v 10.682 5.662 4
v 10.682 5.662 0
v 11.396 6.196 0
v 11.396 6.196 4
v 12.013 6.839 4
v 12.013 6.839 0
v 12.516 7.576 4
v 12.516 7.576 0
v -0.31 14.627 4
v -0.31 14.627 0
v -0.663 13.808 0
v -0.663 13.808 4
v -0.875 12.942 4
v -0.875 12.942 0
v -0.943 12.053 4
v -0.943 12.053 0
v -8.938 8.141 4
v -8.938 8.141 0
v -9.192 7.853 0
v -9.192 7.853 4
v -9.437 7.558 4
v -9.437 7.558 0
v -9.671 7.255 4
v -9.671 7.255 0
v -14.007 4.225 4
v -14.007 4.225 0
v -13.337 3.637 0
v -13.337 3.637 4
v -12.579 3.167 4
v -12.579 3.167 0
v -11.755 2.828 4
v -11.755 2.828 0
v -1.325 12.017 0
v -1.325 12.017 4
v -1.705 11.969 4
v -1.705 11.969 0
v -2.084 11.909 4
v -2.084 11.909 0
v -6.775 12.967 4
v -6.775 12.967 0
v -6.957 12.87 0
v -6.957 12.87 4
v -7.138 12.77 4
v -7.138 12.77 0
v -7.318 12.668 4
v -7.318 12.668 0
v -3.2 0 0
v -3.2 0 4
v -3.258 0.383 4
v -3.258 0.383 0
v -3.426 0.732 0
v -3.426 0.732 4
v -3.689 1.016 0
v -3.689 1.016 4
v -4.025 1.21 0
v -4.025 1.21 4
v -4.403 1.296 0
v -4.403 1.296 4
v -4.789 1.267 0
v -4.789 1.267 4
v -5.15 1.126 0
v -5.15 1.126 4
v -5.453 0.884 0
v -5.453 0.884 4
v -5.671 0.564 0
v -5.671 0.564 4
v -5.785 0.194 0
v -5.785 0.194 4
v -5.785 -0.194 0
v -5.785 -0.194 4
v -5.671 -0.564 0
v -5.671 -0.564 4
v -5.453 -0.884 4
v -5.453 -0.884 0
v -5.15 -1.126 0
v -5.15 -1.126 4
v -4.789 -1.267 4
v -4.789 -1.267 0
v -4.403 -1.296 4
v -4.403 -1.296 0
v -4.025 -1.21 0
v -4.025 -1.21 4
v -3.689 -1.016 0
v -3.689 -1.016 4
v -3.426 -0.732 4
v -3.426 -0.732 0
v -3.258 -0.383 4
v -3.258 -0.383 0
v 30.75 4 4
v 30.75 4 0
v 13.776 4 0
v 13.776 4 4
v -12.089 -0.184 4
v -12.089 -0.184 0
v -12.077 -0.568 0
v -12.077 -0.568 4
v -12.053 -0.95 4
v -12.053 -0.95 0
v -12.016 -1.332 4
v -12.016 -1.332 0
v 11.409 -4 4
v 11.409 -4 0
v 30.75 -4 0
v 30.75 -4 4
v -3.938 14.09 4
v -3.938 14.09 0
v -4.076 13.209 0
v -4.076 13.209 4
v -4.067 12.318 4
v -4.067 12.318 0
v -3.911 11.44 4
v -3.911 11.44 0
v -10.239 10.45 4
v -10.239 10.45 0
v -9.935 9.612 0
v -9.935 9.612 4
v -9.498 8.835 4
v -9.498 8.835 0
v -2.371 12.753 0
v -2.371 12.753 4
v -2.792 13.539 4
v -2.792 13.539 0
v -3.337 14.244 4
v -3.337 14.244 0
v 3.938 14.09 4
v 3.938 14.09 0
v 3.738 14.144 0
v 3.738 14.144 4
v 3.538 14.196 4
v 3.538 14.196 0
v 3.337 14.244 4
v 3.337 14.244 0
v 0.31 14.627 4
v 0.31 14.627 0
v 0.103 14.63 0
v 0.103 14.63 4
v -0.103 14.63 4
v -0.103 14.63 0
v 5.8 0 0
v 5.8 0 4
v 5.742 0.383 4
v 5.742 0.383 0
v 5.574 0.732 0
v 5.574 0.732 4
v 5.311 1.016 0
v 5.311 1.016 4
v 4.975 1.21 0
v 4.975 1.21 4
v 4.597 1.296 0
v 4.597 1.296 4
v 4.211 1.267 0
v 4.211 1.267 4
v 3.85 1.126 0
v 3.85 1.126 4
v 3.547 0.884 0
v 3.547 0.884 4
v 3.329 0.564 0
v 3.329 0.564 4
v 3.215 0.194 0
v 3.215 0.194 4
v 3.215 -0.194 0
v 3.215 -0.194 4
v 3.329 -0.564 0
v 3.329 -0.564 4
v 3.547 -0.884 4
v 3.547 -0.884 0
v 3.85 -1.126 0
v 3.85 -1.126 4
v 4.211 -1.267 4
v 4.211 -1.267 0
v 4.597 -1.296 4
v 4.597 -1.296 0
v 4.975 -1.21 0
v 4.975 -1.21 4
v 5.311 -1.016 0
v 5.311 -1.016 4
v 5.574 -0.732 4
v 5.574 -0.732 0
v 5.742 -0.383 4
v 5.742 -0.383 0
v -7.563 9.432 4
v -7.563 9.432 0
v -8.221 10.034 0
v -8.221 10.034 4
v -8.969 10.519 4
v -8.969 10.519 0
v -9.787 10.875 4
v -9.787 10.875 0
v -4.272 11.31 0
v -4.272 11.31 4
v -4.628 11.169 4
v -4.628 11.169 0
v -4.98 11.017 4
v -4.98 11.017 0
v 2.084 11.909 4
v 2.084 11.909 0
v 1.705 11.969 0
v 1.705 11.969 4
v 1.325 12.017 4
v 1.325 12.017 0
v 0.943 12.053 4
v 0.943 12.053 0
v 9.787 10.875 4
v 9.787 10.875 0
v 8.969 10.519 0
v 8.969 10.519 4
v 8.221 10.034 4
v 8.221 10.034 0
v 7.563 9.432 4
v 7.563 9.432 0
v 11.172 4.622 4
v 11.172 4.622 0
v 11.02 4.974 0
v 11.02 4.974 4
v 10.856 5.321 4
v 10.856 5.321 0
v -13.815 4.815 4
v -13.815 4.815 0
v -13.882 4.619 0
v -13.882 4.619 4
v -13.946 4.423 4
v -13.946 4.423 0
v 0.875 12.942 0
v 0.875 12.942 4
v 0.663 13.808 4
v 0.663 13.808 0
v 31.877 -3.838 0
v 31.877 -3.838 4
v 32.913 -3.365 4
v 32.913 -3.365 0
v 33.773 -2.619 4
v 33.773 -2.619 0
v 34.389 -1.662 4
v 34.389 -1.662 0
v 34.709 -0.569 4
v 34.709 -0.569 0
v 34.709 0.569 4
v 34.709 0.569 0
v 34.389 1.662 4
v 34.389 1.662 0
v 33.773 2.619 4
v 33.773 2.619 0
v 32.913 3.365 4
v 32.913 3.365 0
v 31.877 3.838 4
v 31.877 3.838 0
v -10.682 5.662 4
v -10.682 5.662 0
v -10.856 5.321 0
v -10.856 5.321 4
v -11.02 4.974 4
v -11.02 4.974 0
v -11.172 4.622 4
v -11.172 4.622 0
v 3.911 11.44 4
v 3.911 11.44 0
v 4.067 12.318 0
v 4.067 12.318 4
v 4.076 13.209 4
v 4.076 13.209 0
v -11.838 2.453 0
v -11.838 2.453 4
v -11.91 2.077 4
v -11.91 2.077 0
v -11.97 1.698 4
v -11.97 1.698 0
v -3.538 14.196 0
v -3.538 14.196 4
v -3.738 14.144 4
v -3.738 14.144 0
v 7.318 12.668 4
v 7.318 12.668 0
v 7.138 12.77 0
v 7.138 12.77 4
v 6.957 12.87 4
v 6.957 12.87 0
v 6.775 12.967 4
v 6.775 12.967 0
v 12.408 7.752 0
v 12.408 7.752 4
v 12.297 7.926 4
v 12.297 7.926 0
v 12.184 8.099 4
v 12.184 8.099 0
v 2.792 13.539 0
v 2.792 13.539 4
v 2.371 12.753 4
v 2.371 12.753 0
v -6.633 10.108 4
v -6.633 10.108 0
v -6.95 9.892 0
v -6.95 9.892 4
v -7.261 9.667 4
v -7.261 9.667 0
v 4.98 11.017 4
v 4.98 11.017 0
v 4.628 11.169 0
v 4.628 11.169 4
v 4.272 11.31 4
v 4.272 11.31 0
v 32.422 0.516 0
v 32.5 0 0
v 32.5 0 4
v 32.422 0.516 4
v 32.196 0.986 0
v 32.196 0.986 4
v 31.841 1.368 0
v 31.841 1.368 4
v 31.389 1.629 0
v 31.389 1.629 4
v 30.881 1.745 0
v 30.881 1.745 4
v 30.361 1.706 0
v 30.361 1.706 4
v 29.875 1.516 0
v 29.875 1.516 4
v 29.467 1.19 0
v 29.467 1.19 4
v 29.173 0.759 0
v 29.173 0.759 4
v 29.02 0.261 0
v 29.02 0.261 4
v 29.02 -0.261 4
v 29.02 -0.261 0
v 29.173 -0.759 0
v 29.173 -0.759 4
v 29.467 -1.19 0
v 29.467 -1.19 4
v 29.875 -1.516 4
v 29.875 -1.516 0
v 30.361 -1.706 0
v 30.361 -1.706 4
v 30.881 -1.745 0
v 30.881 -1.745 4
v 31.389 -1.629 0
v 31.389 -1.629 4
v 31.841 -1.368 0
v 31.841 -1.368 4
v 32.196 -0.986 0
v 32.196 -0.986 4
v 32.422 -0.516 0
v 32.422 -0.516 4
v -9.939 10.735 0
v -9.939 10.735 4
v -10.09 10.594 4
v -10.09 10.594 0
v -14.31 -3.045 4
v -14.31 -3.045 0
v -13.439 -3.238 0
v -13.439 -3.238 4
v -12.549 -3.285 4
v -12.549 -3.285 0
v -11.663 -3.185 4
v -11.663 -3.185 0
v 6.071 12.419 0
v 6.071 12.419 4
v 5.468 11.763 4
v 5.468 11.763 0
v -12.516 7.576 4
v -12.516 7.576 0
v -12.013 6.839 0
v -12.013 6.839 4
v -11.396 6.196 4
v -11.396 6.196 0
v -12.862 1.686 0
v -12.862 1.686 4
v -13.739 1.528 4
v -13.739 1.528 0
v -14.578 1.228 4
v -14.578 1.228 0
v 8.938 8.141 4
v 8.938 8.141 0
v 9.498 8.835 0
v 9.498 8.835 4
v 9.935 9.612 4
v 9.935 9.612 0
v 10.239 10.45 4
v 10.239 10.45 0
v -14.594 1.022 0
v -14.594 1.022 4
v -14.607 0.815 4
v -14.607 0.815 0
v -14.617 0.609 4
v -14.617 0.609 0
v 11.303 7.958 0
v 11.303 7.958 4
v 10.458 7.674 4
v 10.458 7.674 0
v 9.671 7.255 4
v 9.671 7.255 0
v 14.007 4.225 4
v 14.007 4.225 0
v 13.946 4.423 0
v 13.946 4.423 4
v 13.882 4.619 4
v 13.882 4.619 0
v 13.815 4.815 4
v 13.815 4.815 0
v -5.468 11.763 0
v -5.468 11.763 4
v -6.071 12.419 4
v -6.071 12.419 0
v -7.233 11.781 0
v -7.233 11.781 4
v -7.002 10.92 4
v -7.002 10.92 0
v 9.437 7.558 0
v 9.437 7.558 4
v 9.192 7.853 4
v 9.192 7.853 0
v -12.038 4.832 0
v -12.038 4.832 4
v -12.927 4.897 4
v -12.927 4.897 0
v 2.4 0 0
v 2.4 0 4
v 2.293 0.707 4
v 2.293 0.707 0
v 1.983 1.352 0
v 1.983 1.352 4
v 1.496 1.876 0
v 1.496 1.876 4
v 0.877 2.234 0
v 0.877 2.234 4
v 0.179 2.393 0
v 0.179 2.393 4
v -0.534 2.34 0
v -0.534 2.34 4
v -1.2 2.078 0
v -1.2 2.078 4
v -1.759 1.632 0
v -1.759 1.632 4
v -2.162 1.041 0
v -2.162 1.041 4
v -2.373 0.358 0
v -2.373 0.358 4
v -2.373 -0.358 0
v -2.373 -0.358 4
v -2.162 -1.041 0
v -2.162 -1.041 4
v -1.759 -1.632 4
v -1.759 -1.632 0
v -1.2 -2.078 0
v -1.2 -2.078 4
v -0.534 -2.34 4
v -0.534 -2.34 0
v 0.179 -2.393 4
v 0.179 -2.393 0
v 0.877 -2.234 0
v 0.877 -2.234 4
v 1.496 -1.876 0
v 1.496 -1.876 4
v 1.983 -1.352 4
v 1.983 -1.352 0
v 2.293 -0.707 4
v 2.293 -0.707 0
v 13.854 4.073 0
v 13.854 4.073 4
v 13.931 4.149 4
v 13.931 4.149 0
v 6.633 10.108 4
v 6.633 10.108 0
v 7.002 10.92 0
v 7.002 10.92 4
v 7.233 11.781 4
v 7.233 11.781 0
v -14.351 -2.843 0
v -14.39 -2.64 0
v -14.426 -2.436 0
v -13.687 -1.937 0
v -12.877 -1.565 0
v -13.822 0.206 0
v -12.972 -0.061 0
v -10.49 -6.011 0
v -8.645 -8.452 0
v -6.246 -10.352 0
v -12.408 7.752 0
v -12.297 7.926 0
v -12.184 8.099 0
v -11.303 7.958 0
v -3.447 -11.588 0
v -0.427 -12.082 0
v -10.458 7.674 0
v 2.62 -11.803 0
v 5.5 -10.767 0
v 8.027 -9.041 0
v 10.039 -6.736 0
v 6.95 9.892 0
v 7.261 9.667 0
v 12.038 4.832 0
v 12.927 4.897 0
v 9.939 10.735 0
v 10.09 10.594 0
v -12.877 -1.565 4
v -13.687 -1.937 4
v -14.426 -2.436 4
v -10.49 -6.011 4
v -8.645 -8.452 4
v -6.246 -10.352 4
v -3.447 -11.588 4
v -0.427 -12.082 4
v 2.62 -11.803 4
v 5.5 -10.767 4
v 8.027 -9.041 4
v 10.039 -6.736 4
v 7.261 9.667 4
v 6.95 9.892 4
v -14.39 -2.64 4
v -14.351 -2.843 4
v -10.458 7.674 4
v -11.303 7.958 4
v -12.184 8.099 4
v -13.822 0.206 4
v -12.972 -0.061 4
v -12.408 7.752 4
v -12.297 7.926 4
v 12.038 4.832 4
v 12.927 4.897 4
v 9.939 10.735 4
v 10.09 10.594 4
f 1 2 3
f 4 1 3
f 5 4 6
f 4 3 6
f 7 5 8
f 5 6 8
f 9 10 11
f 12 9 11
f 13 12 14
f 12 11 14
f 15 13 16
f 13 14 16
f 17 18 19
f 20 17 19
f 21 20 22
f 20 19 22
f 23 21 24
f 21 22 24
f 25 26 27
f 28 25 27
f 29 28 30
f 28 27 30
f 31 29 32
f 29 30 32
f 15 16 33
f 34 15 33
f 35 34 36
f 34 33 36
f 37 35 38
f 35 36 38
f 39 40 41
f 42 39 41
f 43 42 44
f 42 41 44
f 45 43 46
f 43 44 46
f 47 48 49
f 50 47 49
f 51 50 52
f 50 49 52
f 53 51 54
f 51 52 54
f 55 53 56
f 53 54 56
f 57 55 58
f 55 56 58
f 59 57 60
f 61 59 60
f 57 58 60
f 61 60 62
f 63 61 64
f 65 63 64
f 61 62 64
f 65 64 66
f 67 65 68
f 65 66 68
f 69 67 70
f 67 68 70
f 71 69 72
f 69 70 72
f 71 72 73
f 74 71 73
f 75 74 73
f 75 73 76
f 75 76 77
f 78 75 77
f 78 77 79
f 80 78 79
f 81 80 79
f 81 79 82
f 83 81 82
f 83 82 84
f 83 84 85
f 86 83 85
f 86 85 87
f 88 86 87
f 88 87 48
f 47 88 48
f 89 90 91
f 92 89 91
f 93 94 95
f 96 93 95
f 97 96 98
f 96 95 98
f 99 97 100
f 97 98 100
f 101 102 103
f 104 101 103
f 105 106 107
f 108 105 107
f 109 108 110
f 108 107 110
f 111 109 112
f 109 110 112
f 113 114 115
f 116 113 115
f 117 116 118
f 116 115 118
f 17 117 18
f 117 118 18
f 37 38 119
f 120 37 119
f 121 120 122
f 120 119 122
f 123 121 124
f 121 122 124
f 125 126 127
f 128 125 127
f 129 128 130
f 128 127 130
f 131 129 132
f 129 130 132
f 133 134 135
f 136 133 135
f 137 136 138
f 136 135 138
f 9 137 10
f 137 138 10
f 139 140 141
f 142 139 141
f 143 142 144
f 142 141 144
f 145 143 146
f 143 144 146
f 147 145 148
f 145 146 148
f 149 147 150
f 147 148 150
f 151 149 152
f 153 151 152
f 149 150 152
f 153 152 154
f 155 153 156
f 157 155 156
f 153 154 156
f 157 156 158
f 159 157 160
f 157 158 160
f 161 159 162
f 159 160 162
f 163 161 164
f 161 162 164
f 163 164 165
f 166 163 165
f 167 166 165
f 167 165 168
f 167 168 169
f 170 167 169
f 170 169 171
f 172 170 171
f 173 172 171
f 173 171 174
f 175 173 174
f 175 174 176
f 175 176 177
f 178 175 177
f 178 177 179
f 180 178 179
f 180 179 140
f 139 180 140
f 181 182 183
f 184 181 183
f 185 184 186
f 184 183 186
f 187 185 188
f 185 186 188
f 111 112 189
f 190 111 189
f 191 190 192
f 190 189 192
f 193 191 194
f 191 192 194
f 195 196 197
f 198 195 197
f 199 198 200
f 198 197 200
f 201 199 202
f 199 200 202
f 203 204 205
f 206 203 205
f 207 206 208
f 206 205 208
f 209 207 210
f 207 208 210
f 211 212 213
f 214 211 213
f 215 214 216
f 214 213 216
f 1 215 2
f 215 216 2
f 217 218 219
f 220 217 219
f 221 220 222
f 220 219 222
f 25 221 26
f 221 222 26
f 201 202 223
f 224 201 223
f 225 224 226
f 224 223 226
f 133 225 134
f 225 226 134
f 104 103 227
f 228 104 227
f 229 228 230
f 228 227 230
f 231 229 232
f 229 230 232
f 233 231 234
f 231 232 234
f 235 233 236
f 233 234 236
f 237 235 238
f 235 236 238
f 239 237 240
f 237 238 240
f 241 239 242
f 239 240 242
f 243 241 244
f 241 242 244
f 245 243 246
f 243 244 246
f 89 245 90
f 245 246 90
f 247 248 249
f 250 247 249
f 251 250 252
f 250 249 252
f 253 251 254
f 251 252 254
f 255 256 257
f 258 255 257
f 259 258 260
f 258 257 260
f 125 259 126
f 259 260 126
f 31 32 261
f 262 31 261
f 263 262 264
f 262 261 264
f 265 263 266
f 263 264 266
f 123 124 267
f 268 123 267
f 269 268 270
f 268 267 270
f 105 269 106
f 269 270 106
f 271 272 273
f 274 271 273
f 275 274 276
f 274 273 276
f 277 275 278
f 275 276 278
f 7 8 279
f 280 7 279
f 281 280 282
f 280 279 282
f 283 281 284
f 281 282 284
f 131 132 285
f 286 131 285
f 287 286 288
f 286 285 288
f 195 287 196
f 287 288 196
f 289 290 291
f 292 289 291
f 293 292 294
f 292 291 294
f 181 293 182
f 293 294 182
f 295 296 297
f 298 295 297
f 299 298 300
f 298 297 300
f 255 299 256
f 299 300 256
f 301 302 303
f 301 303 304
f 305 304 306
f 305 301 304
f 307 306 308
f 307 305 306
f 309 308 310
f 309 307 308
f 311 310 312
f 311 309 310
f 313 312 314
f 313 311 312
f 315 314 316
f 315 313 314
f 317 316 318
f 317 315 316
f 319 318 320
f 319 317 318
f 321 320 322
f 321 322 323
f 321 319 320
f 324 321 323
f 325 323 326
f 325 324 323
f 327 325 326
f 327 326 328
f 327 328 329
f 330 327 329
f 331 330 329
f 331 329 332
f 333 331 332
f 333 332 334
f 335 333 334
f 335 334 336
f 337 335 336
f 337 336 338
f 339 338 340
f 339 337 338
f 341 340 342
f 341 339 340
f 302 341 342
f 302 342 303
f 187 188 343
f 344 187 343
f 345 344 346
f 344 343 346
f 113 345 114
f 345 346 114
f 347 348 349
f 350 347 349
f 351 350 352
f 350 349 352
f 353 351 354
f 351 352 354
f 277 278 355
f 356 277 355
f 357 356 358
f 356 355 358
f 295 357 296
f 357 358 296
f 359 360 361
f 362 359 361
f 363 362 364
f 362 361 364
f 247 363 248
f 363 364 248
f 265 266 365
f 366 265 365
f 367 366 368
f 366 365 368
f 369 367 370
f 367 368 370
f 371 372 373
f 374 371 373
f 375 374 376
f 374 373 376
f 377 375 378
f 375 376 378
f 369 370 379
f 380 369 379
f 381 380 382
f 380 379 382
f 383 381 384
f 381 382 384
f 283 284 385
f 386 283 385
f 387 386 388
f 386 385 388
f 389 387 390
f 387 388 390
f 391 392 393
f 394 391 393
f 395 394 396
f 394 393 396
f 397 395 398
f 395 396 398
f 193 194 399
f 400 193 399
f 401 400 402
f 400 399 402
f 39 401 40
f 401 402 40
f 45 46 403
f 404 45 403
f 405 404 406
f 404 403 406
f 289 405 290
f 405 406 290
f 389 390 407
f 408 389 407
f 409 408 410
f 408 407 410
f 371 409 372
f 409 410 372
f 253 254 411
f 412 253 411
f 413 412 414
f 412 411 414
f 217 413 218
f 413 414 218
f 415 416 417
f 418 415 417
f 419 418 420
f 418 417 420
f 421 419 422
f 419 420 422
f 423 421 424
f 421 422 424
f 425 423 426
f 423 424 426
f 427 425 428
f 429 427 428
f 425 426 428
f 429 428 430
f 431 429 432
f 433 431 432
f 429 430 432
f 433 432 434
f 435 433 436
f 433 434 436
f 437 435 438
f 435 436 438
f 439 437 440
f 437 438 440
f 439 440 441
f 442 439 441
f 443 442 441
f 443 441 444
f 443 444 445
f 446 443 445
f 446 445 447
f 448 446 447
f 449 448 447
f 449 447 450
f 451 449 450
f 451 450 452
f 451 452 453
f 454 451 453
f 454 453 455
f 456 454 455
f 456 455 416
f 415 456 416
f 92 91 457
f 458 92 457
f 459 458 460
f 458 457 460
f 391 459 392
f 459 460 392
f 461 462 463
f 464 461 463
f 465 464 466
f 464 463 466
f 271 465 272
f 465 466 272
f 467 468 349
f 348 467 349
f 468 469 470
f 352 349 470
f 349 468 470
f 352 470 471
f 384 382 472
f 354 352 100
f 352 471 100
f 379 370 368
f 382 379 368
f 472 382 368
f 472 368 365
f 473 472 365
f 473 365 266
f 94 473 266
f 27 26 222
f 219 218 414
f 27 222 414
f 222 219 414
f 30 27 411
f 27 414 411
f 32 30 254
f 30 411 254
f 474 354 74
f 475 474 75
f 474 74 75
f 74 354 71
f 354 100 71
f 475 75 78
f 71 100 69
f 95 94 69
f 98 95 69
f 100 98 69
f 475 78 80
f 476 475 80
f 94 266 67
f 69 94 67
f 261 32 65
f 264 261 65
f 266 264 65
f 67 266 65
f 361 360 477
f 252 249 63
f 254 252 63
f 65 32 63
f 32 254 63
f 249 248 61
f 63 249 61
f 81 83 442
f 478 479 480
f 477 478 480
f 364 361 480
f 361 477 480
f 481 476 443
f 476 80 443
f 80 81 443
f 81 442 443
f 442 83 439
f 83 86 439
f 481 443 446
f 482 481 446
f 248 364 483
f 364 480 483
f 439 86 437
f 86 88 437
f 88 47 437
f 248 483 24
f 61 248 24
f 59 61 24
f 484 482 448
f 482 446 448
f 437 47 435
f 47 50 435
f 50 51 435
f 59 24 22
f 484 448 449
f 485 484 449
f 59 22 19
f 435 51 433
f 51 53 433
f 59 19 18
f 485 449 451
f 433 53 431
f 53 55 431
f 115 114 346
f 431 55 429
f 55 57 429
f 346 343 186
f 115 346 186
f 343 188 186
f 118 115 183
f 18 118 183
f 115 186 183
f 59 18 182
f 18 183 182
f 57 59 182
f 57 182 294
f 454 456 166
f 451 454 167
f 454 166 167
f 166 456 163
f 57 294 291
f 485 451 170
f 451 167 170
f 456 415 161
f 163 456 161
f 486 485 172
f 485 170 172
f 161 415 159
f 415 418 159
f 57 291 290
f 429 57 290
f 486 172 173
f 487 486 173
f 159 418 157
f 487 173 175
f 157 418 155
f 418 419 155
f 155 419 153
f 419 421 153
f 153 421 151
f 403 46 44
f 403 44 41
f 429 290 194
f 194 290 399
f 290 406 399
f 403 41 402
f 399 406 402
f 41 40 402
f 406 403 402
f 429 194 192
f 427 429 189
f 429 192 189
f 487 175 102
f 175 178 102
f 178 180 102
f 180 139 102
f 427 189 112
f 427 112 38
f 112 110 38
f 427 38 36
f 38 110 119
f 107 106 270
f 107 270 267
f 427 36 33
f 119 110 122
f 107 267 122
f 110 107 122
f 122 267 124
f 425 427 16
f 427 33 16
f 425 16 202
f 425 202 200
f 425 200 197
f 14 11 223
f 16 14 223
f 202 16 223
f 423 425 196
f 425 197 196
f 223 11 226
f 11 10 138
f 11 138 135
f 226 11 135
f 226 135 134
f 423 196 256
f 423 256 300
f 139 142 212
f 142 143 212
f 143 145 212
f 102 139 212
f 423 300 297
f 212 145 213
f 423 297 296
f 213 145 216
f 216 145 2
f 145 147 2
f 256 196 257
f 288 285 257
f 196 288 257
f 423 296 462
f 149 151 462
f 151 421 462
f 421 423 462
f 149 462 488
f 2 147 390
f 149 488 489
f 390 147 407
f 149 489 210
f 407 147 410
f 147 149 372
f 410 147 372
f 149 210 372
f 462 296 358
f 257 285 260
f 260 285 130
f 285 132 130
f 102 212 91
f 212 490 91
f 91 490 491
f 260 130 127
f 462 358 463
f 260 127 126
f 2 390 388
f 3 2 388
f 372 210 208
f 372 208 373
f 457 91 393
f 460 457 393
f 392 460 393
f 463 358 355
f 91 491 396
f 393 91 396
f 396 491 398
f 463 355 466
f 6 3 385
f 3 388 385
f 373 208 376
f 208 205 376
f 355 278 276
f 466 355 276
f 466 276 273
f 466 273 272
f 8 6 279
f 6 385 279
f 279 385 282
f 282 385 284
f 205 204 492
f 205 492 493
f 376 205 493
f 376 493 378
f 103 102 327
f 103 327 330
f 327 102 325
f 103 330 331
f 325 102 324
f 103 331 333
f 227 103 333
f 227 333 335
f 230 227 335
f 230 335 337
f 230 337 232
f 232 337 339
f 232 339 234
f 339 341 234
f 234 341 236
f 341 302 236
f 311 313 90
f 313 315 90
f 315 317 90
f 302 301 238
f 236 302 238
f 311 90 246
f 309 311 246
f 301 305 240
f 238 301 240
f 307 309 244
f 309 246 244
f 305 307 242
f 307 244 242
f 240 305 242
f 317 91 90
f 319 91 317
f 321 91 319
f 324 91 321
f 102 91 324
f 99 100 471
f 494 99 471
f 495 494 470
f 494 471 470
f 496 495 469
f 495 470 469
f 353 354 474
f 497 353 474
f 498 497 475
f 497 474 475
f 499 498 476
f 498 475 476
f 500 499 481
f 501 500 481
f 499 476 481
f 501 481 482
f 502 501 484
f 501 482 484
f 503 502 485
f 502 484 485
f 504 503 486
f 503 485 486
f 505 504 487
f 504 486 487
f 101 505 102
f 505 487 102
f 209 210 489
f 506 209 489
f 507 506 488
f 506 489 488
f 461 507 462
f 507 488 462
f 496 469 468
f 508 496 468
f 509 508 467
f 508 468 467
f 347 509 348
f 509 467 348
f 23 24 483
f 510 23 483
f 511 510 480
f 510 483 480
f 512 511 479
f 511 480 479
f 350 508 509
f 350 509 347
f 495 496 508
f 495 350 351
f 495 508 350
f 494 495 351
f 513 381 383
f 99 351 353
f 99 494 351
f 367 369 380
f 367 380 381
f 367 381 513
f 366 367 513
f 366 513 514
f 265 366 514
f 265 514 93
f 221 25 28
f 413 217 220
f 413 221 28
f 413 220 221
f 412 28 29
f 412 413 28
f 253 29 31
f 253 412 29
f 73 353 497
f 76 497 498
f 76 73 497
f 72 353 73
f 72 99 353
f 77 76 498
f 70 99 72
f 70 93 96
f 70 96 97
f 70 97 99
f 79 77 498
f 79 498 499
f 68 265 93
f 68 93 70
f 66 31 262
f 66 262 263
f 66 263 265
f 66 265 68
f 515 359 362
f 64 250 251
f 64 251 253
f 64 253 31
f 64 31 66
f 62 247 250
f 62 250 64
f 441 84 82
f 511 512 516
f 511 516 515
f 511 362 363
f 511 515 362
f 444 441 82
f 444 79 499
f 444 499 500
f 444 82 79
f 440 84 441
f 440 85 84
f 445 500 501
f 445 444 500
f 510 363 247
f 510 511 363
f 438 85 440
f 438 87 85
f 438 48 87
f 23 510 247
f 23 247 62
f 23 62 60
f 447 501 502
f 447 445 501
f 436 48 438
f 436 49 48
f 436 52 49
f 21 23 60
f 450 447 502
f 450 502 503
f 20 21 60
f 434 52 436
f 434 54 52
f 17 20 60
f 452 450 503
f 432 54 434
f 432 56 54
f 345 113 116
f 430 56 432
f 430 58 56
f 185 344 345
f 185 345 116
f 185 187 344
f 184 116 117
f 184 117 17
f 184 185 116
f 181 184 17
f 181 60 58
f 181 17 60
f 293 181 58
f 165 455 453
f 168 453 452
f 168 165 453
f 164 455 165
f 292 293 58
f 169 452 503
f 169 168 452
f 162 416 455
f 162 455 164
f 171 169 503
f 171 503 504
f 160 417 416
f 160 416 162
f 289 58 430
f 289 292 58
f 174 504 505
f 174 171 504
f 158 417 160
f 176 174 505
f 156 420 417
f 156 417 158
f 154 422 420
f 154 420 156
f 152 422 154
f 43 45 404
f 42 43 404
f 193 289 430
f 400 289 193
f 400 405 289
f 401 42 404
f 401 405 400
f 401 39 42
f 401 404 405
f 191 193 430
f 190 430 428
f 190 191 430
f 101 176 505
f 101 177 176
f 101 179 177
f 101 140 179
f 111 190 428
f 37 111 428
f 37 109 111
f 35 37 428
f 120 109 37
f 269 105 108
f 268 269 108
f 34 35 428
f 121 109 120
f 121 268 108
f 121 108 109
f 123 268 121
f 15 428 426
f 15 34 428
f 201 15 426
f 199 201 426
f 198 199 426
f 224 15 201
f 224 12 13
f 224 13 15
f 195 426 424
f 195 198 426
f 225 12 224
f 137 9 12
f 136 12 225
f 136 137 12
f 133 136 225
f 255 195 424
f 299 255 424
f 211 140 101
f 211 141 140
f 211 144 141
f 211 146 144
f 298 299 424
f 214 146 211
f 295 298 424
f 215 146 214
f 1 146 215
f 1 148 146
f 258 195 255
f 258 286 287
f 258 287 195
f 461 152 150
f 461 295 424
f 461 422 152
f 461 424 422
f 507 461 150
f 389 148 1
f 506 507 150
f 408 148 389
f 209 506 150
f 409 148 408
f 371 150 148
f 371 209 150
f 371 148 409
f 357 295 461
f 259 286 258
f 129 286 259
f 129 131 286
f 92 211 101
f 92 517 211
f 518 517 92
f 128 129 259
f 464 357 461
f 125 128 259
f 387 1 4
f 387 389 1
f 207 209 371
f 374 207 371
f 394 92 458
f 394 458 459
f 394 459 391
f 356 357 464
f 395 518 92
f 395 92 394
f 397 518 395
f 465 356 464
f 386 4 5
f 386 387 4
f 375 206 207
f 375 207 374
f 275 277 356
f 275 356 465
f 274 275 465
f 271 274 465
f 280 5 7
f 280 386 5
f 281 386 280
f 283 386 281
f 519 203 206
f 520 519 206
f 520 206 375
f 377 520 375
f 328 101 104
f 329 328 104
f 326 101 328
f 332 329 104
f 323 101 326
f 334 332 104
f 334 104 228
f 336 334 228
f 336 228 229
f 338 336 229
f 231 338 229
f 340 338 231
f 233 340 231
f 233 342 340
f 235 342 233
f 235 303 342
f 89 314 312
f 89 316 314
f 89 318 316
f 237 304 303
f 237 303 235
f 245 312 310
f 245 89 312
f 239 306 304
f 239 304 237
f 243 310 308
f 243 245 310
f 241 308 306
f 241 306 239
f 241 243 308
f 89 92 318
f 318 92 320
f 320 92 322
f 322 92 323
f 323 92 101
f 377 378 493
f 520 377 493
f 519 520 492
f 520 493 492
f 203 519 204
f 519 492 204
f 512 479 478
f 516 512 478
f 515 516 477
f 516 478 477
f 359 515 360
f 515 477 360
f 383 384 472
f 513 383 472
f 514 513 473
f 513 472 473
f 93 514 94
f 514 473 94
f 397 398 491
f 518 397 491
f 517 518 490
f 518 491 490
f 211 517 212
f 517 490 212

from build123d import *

# Parameters (mm, degrees)
SKETCH1_R           = 1.75
BOSS_EXTRUDE1_DEPTH = 4
SKETCH2_R           = 1.3
SKETCH2_R_2         = 2.4
CUT_EXTRUDE1_DEPTH  = 20


with BuildPart() as part:
    # Sketch1 → Boss-Extrude1 (new body)
    with BuildSketch(Plane.XY):
        with BuildLine():
            ThreePointArc((13.776114953, 4), (13.893050478, 4.110818553), (14.006628151, 4.225076075))
            ThreePointArc((14.006628151, 4.225076075), (13.913956833, 4.520918628), (13.815037615, 4.814731115))
            ThreePointArc((13.815037615, 4.814731115), (12.481386111, 4.882828881), (11.171803009, 4.621570895))
            ThreePointArc((11.171803009, 4.621570895), (10.939359064, 5.147671635), (10.682156823, 5.662122005))
            ThreePointArc((10.682156823, 5.662122005), (11.718219248, 6.50464102), (12.515850479, 7.575644315))
            ThreePointArc((12.515850479, 7.575644315), (12.35251755, 7.839146011), (12.183637866, 8.099127629))
            ThreePointArc((12.183637866, 8.099127629), (10.874950252, 7.833420336), (9.671482329, 7.254690176))
            ThreePointArc((9.671482329, 7.254690176), (9.315505105, 7.706456036), (8.938444741, 8.140780406))
            ThreePointArc((8.938444741, 8.140780406), (9.7324314, 9.214488384), (10.238655891, 10.450206961))
            ThreePointArc((10.238655891, 10.450206961), (10.01492416, 10.664811019), (9.786695342, 10.874626167))
            ThreePointArc((9.786695342, 10.874626167), (8.585201272, 10.291809183), (7.563466846, 9.431970593))
            ThreePointArc((7.563466846, 9.431970593), (7.1063237, 9.781015462), (6.633097302, 10.107923633))
            ThreePointArc((6.633097302, 10.107923633), (7.135119095, 11.345355554), (7.318128899, 12.668144672))
            ThreePointArc((7.318128899, 12.668144672), (7.048056252, 12.820366729), (6.774818757, 12.966831949))
            ThreePointArc((6.774818757, 12.966831949), (5.756012523, 12.103525808), (4.980210924, 11.016605609))
            ThreePointArc((4.980210924, 11.016605609), (4.450625842, 11.240997714), (3.910967965, 11.439948845))
            ThreePointArc((3.910967965, 11.439948845), (4.089481015, 12.763352309), (3.937776954, 14.090096262))
            ThreePointArc((3.937776954, 14.090096262), (3.638333049, 14.170371647), (3.337255394, 14.244283992))
            ThreePointArc((3.337255394, 14.244283992), (2.565152337, 13.154733392), (2.084030034, 11.909026779))
            ThreePointArc((2.084030034, 11.909026779), (1.515278794, 11.994666739), (0.943098128, 12.053159997))
            ThreePointArc((0.943098128, 12.053159997), (0.786885803, 13.379380698), (0.31, 14.626715284))
            ThreePointArc((0.31, 14.626715284), (0, 14.63), (-0.31, 14.626715284))
            ThreePointArc((-0.31, 14.626715284), (-0.786885803, 13.379380698), (-0.943098128, 12.053159997))
            ThreePointArc((-0.943098128, 12.053159997), (-1.515278794, 11.994666739), (-2.084030034, 11.909026779))
            ThreePointArc((-2.084030034, 11.909026779), (-2.565152337, 13.154733392), (-3.337255394, 14.244283992))
            ThreePointArc((-3.337255394, 14.244283992), (-3.638333049, 14.170371647), (-3.937776954, 14.090096262))
            ThreePointArc((-3.937776954, 14.090096262), (-4.089481015, 12.763352309), (-3.910967965, 11.439948845))
            ThreePointArc((-3.910967965, 11.439948845), (-4.450625842, 11.240997714), (-4.980210924, 11.016605609))
            ThreePointArc((-4.980210924, 11.016605609), (-5.756012523, 12.103525808), (-6.774818757, 12.966831949))
            ThreePointArc((-6.774818757, 12.966831949), (-7.048056252, 12.820366729), (-7.318128899, 12.668144672))
            ThreePointArc((-7.318128899, 12.668144672), (-7.135119095, 11.345355554), (-6.633097302, 10.107923633))
            ThreePointArc((-6.633097302, 10.107923633), (-7.1063237, 9.781015462), (-7.563466846, 9.431970593))
            ThreePointArc((-7.563466846, 9.431970593), (-8.585201272, 10.291809183), (-9.786695342, 10.874626167))
            ThreePointArc((-9.786695342, 10.874626167), (-10.01492416, 10.664811019), (-10.238655891, 10.450206961))
            ThreePointArc((-10.238655891, 10.450206961), (-9.7324314, 9.214488384), (-8.938444741, 8.140780406))
            ThreePointArc((-8.938444741, 8.140780406), (-9.315505105, 7.706456036), (-9.671482329, 7.254690176))
            ThreePointArc((-9.671482329, 7.254690176), (-10.874950252, 7.833420336), (-12.183637866, 8.099127629))
            ThreePointArc((-12.183637866, 8.099127629), (-12.35251755, 7.839146011), (-12.515850479, 7.575644315))
            ThreePointArc((-12.515850479, 7.575644315), (-11.718219248, 6.50464102), (-10.682156823, 5.662122005))
            ThreePointArc((-10.682156823, 5.662122005), (-10.939359064, 5.147671635), (-11.171803009, 4.621570895))
            ThreePointArc((-11.171803009, 4.621570895), (-12.481386111, 4.882828881), (-13.815037615, 4.814731115))
            ThreePointArc((-13.815037615, 4.814731115), (-13.913956833, 4.520918628), (-14.006628151, 4.225076075))
            ThreePointArc((-14.006628151, 4.225076075), (-12.967708283, 3.386083139), (-11.754669706, 2.827691655))
            ThreePointArc((-11.754669706, 2.827691655), (-11.875852861, 2.265440093), (-11.970158218, 1.698061317))
            ThreePointArc((-11.970158218, 1.698061317), (-13.303570578, 1.625431329), (-14.578387742, 1.227807338))
            ThreePointArc((-14.578387742, 1.227807338), (-14.601131037, 0.918625301), (-14.617317864, 0.609030766))
            ThreePointArc((-14.617317864, 0.609030766), (-13.402388515, 0.054765201), (-12.088593461, -0.184412961))
            ThreePointArc((-12.088593461, -0.184412961), (-12.066143147, -0.759137381), (-12.016384363, -1.332143698))
            ThreePointArc((-12.016384363, -1.332143698), (-13.289842779, -1.734098051), (-14.425724151, -2.43626409))
            ThreePointArc((-14.425724151, -2.43626409), (-14.370862478, -2.741388632), (-14.309547736, -3.045282186))
            ThreePointArc((-14.309547736, -3.045282186), (-12.994947386, -3.279993836), (-11.662946429, -3.184930232))
            ThreePointArc((-11.662946429, -3.184930232), (-0.426838607, -12.082462862), (11.409123542, -4))
            Line((11.409123542, -4), (30.75, -4))
            ThreePointArc((30.75, -4), (34.75, 0), (30.75, 4))
            Line((30.75, 4), (13.776114953, 4))
        make_face()
        Circle(SKETCH1_R, mode=Mode.SUBTRACT)
        with Locations((30.75, 0)):
            Circle(SKETCH1_R, mode=Mode.SUBTRACT)
    extrude(amount=BOSS_EXTRUDE1_DEPTH)

    # Sketch2 → Cut-Extrude1 (cut)
    with BuildSketch(Plane.XY.offset(4)):
        with Locations((4.5, 0)):
            Circle(SKETCH2_R)
        with Locations((-4.5, 0)):
            Circle(SKETCH2_R)
        Circle(SKETCH2_R_2)
    extrude(amount=-CUT_EXTRUDE1_DEPTH, mode=Mode.SUBTRACT)


solid = part.part
